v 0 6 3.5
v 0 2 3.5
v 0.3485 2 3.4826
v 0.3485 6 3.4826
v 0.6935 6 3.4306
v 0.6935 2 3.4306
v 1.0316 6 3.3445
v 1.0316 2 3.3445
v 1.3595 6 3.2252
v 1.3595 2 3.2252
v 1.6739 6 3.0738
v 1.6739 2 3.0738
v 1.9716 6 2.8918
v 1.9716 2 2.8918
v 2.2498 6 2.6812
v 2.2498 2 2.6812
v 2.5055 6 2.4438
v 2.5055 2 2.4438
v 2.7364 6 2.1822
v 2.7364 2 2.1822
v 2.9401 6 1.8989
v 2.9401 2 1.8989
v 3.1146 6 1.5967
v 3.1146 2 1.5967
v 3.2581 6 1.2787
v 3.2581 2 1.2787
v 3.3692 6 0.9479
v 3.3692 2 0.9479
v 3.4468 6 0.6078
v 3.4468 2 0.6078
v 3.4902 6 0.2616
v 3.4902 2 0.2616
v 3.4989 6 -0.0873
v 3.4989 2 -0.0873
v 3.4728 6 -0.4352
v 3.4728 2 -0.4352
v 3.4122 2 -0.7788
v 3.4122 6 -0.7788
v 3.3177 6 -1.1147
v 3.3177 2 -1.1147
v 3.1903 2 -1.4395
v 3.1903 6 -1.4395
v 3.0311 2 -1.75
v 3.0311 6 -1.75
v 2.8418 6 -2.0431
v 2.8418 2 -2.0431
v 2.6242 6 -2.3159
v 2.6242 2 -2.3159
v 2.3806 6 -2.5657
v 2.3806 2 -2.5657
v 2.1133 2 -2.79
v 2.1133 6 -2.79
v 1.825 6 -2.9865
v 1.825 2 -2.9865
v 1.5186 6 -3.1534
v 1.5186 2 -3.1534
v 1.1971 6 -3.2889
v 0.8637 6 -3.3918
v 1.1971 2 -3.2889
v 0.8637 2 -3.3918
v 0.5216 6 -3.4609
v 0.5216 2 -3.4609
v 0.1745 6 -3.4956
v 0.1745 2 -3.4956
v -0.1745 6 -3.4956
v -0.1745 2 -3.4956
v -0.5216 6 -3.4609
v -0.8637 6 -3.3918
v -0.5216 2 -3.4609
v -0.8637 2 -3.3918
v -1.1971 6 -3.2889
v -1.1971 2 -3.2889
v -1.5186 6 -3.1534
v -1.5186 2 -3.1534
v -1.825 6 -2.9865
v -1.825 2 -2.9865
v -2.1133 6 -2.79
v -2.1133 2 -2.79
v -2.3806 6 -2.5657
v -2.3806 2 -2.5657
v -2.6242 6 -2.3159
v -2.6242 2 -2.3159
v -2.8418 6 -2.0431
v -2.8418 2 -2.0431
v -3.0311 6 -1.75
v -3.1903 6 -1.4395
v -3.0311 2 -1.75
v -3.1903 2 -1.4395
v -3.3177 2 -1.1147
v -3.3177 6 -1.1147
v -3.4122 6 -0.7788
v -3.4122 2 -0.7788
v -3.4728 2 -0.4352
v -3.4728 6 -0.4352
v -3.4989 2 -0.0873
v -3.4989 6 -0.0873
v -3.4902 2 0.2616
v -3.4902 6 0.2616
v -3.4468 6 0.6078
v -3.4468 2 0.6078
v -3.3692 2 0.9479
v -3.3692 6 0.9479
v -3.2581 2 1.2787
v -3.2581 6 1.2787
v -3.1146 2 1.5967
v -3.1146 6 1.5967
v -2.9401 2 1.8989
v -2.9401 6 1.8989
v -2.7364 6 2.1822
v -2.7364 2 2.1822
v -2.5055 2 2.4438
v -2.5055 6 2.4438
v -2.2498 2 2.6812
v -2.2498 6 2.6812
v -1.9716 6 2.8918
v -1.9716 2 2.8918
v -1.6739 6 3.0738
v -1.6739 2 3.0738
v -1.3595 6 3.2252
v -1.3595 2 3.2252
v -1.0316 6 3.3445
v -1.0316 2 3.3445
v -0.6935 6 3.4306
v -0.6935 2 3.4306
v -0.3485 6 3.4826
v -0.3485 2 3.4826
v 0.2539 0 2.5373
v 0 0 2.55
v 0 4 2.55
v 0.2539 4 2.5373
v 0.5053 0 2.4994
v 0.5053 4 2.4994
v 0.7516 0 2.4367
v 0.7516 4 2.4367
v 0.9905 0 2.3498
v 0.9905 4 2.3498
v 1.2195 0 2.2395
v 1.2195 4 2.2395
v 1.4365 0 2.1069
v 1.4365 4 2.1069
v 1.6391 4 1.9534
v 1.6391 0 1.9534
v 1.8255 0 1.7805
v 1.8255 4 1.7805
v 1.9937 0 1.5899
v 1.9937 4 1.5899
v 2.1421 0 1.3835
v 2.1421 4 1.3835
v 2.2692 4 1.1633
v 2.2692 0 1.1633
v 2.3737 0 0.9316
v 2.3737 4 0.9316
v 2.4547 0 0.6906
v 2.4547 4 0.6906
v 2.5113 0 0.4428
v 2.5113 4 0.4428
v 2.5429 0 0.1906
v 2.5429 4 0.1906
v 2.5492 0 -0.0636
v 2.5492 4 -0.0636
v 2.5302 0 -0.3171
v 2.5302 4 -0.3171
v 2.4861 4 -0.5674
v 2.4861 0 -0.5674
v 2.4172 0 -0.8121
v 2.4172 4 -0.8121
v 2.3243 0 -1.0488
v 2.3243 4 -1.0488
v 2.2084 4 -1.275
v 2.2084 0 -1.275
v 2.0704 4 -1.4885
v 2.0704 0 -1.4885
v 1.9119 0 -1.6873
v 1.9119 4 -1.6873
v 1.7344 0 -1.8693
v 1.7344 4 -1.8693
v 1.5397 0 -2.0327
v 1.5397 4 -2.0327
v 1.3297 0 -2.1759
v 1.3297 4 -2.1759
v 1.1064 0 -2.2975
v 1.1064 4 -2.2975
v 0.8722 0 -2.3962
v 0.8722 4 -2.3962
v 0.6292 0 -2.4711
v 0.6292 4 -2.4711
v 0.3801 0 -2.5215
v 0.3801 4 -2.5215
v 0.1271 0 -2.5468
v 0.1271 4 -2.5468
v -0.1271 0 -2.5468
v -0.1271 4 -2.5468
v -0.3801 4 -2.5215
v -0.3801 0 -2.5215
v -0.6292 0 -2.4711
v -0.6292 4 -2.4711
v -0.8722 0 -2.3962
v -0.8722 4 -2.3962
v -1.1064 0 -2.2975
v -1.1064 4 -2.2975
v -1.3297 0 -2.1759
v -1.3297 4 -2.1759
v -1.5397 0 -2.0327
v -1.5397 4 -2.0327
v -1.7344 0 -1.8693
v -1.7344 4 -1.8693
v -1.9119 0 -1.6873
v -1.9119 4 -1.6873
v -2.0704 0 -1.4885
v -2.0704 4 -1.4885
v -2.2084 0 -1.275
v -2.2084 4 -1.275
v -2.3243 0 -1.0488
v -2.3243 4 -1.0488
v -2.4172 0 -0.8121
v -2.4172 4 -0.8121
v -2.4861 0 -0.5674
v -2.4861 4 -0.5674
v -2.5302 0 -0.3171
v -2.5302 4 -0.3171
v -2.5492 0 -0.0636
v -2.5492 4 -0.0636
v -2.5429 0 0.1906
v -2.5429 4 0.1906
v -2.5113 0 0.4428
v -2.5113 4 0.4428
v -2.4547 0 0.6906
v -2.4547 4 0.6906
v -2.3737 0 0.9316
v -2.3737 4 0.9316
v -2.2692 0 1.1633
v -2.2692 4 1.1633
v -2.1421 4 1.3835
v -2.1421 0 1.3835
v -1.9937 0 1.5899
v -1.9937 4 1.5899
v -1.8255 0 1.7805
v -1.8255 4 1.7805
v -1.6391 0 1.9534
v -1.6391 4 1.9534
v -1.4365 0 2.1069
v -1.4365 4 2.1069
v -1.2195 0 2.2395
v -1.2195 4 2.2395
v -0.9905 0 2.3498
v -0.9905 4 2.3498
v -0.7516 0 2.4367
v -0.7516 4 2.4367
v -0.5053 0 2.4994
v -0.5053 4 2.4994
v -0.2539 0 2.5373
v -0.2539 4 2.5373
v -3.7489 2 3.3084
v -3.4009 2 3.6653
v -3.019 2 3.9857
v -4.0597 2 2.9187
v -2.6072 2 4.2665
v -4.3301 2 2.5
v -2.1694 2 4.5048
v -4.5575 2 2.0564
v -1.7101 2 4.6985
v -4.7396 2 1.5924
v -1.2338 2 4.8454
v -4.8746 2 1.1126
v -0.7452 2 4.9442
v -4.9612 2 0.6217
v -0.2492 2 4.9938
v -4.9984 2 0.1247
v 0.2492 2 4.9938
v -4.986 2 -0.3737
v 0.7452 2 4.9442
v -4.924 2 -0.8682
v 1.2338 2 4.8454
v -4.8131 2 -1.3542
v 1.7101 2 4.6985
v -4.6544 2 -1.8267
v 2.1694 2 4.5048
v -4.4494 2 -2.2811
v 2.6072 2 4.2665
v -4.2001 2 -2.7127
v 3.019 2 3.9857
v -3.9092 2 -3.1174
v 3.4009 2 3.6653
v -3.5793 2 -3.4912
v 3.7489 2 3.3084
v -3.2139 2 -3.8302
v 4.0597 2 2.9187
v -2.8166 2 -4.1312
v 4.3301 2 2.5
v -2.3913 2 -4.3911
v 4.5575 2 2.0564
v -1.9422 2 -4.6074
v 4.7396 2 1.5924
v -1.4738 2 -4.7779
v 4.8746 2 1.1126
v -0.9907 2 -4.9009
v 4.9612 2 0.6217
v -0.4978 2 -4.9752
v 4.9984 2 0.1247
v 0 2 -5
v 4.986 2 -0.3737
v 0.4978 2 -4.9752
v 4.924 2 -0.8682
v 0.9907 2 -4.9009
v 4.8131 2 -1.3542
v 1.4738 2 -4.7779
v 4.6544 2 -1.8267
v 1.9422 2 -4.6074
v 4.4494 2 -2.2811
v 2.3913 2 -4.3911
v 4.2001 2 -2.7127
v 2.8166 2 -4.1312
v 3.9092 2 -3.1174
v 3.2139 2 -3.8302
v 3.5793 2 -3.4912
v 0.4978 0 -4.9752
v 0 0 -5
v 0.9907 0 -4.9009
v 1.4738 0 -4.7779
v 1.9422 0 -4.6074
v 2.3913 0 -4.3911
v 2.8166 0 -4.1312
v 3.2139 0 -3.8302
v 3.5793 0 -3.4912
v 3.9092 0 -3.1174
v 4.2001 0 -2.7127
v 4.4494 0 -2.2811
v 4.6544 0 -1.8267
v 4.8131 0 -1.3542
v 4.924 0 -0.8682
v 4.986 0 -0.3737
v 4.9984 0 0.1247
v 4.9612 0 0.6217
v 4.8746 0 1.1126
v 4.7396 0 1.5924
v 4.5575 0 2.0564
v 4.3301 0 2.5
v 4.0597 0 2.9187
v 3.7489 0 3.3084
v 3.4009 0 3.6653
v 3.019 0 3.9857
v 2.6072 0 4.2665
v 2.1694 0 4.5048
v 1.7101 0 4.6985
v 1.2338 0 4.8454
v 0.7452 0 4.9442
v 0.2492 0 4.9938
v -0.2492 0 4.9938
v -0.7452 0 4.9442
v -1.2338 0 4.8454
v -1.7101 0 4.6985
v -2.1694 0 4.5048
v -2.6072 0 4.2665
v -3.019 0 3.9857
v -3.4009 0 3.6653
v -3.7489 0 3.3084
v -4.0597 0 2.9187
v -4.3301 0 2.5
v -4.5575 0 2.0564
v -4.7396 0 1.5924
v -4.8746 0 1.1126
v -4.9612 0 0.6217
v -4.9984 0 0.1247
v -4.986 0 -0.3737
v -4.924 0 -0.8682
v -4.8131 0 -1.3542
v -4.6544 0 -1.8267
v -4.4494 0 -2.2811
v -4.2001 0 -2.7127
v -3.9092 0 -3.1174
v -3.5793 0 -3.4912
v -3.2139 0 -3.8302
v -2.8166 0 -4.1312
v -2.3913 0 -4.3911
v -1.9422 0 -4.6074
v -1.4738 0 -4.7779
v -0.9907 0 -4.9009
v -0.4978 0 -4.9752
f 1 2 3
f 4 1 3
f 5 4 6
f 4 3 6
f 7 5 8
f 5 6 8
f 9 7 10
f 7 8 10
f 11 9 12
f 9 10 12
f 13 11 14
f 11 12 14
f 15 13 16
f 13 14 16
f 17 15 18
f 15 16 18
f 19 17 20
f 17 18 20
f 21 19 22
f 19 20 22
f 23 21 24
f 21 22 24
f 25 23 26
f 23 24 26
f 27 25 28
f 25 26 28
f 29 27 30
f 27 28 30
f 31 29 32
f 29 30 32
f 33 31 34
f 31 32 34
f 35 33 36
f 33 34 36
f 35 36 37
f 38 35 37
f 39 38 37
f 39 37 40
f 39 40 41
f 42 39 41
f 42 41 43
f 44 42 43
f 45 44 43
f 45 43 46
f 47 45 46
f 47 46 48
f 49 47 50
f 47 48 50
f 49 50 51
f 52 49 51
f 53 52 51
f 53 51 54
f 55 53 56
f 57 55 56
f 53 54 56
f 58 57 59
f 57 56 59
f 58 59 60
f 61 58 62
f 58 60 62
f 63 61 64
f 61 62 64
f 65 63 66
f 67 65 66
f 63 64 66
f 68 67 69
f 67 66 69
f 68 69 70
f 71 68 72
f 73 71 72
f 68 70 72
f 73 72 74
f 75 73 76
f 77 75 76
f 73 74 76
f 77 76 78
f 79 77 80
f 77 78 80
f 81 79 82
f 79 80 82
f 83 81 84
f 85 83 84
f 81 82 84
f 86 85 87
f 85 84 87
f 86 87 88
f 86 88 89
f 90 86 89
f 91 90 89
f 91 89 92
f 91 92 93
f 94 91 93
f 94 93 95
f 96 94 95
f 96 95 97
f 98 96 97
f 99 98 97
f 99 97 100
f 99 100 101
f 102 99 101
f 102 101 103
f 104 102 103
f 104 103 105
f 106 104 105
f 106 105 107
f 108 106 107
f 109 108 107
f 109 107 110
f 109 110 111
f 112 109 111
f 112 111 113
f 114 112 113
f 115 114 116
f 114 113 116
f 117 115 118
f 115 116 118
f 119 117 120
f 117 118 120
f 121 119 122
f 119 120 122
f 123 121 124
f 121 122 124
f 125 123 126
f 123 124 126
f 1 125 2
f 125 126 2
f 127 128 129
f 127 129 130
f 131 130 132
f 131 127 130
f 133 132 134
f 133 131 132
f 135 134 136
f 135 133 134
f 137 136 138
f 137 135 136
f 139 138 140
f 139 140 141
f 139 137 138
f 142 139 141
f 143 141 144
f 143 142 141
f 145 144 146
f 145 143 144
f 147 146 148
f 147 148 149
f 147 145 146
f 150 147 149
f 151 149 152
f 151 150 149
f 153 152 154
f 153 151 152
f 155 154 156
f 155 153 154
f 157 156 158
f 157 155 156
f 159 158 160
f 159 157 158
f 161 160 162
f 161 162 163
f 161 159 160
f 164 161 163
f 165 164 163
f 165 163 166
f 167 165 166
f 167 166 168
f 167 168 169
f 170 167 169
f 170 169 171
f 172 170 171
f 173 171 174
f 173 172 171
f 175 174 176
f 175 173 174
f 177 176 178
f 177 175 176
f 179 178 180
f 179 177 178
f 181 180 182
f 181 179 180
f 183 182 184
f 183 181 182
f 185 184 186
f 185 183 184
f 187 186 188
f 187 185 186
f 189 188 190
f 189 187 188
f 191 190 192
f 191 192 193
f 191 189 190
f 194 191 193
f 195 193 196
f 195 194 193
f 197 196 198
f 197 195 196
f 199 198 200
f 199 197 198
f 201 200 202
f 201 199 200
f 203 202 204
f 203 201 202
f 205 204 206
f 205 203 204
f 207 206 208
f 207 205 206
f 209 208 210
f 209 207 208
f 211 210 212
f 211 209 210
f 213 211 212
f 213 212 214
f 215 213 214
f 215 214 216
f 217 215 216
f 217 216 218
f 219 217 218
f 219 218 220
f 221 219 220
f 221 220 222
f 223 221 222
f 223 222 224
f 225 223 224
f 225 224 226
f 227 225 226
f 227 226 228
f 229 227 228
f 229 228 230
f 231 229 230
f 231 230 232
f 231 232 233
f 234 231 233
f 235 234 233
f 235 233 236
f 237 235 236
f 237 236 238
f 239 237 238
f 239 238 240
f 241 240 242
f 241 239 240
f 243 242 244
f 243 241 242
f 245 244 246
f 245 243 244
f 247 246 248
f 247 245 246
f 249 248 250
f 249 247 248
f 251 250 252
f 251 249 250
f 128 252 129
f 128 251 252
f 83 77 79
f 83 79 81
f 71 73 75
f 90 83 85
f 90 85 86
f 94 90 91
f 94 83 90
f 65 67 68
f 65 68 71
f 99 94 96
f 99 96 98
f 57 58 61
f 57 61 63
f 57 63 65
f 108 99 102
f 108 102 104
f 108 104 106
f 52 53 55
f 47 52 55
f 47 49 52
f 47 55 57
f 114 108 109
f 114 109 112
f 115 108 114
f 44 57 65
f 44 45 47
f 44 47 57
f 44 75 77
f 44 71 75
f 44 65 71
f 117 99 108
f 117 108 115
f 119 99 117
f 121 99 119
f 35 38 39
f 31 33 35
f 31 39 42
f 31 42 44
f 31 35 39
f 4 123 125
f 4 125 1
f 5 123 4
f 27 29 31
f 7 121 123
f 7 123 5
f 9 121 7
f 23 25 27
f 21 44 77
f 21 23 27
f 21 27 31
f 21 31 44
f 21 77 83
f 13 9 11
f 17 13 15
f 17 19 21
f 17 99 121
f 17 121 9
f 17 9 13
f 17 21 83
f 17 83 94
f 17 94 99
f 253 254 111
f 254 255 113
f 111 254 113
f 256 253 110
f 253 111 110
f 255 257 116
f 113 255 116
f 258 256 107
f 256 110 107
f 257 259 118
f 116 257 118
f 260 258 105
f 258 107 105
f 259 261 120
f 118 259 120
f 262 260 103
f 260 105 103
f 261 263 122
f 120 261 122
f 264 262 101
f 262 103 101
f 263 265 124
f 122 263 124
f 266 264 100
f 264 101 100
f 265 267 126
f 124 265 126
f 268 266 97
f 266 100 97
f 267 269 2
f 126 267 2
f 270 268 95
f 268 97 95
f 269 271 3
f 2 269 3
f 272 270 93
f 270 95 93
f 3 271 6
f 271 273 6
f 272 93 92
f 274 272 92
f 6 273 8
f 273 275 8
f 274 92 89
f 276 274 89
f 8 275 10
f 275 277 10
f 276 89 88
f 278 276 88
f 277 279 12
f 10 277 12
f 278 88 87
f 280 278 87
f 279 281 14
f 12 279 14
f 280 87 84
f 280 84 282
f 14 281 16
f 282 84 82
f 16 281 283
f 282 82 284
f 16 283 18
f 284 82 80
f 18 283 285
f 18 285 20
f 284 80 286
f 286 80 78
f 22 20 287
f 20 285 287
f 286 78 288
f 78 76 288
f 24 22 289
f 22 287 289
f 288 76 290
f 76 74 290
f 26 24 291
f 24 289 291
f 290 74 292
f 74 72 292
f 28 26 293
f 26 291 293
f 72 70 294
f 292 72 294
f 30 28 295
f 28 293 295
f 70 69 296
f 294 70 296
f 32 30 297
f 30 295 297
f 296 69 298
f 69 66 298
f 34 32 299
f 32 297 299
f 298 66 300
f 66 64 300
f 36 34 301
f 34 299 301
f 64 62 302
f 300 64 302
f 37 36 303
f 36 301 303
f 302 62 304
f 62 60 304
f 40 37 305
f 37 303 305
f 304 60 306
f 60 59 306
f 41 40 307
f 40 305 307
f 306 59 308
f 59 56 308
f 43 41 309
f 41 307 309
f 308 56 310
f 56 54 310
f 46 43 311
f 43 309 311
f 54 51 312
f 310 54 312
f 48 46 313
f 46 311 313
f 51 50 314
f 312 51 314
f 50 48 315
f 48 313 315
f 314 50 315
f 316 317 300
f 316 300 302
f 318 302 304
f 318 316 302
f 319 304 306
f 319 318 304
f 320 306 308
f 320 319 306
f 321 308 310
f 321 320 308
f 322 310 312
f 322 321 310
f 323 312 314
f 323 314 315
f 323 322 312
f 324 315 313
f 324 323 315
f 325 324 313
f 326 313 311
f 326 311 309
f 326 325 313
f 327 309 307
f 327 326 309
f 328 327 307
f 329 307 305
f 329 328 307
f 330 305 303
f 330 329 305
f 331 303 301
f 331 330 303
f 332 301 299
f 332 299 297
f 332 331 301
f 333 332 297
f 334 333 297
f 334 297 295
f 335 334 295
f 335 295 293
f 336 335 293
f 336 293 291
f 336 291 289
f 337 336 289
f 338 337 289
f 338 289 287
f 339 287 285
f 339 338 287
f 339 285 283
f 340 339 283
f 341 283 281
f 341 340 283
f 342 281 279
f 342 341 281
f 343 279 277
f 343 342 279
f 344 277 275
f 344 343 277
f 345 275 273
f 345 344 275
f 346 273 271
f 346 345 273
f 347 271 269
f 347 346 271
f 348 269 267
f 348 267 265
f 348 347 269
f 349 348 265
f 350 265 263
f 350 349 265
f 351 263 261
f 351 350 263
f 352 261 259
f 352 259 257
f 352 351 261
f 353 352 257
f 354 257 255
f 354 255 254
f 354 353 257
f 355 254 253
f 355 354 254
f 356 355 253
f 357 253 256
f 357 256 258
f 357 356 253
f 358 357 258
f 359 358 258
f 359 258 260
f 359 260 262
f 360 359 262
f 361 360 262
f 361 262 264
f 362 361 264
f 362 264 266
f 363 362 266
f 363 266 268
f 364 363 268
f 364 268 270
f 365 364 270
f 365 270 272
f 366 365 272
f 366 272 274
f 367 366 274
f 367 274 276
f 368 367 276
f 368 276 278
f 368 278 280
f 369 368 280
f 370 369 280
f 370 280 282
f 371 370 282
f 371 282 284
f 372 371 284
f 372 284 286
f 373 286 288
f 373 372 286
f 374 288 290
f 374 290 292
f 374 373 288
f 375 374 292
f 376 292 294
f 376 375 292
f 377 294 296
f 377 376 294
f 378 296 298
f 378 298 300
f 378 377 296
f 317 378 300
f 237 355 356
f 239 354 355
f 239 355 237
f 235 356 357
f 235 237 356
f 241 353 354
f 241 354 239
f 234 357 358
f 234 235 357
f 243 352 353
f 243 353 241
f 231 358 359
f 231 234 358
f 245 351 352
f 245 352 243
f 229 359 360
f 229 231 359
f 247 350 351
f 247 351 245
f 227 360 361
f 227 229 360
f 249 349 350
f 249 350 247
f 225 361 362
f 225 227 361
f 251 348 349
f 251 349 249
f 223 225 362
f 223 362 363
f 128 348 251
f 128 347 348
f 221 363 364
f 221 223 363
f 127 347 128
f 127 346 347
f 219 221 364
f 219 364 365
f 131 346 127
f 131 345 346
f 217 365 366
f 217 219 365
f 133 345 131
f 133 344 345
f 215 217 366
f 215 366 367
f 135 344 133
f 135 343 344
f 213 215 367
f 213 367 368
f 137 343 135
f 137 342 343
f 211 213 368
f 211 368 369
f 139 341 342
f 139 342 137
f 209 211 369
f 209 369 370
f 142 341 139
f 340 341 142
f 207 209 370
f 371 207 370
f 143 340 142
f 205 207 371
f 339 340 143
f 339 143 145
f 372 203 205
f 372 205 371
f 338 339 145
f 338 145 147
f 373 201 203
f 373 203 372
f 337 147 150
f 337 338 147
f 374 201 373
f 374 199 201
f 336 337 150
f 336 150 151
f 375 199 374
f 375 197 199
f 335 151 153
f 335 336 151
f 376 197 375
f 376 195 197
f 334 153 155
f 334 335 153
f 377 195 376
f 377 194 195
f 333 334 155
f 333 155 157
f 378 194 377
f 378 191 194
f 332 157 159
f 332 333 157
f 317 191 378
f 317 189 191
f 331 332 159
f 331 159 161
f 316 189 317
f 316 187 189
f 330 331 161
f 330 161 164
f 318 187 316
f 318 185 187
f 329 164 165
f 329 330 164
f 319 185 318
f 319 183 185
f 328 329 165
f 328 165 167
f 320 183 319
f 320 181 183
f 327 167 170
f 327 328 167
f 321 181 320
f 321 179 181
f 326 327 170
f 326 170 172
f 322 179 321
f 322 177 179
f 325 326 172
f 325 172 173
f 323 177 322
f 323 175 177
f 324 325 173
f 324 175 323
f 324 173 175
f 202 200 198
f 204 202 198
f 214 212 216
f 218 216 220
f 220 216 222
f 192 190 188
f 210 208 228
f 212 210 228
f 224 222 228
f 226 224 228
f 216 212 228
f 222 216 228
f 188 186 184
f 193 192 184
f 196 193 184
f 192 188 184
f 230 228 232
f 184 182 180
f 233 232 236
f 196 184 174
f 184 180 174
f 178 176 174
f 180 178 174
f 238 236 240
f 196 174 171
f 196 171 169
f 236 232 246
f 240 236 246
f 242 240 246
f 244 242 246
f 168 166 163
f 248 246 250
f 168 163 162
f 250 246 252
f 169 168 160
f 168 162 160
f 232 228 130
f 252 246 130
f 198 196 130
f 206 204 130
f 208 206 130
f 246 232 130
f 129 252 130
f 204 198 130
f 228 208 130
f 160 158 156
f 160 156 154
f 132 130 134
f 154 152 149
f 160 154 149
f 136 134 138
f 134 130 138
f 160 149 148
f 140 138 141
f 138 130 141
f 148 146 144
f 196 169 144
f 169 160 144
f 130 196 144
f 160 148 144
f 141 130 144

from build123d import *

# Parameters (mm, degrees)
SKETCH1_R           = 3.5
SKETCH1_R_2         = 2.55
BOSS_EXTRUDE1_DEPTH = 4
SKETCH2_R           = 3.5
BOSS_EXTRUDE2_DEPTH = 2
SKETCH4_R           = 5
SKETCH4_R_2         = 3.5
BOSS_EXTRUDE3_DEPTH = 2


with BuildPart() as part:
    # Sketch1 → Boss-Extrude1 (new body)
    with BuildSketch(Plane(origin=(0, 0, 0), x_dir=(1, 0, 0), z_dir=(0, 1, 0))):
        with Locations(Location((0, 0, 0), (0, 0, 270))):
            Circle(SKETCH1_R)
        with Locations(Location((0, 0, 0), (0, 0, 270))):
            Circle(SKETCH1_R_2, mode=Mode.SUBTRACT)
    extrude(amount=BOSS_EXTRUDE1_DEPTH)

    # Sketch2 → Boss-Extrude2 (add)
    with BuildSketch(Plane(origin=(0, 4, 0), x_dir=(1, 0, 0), z_dir=(0, 1, 0))):
        with Locations(Location((0, 0, 0), (0, 0, 270))):
            Circle(SKETCH2_R)
    extrude(amount=BOSS_EXTRUDE2_DEPTH)

    # Sketch4 → Boss-Extrude3 (add)
    with BuildSketch(Plane(origin=(0, 0, 0), x_dir=(-1, 0, 0), z_dir=(0, -1, 0))):
        with Locations(Location((0, 0, 0), (0, 0, 90))):
            Circle(SKETCH4_R)
        with Locations(Location((0, 0, 0), (0, 0, 90))):
            Circle(SKETCH4_R_2, mode=Mode.SUBTRACT)
    extrude(amount=-BOSS_EXTRUDE3_DEPTH)


solid = part.part
